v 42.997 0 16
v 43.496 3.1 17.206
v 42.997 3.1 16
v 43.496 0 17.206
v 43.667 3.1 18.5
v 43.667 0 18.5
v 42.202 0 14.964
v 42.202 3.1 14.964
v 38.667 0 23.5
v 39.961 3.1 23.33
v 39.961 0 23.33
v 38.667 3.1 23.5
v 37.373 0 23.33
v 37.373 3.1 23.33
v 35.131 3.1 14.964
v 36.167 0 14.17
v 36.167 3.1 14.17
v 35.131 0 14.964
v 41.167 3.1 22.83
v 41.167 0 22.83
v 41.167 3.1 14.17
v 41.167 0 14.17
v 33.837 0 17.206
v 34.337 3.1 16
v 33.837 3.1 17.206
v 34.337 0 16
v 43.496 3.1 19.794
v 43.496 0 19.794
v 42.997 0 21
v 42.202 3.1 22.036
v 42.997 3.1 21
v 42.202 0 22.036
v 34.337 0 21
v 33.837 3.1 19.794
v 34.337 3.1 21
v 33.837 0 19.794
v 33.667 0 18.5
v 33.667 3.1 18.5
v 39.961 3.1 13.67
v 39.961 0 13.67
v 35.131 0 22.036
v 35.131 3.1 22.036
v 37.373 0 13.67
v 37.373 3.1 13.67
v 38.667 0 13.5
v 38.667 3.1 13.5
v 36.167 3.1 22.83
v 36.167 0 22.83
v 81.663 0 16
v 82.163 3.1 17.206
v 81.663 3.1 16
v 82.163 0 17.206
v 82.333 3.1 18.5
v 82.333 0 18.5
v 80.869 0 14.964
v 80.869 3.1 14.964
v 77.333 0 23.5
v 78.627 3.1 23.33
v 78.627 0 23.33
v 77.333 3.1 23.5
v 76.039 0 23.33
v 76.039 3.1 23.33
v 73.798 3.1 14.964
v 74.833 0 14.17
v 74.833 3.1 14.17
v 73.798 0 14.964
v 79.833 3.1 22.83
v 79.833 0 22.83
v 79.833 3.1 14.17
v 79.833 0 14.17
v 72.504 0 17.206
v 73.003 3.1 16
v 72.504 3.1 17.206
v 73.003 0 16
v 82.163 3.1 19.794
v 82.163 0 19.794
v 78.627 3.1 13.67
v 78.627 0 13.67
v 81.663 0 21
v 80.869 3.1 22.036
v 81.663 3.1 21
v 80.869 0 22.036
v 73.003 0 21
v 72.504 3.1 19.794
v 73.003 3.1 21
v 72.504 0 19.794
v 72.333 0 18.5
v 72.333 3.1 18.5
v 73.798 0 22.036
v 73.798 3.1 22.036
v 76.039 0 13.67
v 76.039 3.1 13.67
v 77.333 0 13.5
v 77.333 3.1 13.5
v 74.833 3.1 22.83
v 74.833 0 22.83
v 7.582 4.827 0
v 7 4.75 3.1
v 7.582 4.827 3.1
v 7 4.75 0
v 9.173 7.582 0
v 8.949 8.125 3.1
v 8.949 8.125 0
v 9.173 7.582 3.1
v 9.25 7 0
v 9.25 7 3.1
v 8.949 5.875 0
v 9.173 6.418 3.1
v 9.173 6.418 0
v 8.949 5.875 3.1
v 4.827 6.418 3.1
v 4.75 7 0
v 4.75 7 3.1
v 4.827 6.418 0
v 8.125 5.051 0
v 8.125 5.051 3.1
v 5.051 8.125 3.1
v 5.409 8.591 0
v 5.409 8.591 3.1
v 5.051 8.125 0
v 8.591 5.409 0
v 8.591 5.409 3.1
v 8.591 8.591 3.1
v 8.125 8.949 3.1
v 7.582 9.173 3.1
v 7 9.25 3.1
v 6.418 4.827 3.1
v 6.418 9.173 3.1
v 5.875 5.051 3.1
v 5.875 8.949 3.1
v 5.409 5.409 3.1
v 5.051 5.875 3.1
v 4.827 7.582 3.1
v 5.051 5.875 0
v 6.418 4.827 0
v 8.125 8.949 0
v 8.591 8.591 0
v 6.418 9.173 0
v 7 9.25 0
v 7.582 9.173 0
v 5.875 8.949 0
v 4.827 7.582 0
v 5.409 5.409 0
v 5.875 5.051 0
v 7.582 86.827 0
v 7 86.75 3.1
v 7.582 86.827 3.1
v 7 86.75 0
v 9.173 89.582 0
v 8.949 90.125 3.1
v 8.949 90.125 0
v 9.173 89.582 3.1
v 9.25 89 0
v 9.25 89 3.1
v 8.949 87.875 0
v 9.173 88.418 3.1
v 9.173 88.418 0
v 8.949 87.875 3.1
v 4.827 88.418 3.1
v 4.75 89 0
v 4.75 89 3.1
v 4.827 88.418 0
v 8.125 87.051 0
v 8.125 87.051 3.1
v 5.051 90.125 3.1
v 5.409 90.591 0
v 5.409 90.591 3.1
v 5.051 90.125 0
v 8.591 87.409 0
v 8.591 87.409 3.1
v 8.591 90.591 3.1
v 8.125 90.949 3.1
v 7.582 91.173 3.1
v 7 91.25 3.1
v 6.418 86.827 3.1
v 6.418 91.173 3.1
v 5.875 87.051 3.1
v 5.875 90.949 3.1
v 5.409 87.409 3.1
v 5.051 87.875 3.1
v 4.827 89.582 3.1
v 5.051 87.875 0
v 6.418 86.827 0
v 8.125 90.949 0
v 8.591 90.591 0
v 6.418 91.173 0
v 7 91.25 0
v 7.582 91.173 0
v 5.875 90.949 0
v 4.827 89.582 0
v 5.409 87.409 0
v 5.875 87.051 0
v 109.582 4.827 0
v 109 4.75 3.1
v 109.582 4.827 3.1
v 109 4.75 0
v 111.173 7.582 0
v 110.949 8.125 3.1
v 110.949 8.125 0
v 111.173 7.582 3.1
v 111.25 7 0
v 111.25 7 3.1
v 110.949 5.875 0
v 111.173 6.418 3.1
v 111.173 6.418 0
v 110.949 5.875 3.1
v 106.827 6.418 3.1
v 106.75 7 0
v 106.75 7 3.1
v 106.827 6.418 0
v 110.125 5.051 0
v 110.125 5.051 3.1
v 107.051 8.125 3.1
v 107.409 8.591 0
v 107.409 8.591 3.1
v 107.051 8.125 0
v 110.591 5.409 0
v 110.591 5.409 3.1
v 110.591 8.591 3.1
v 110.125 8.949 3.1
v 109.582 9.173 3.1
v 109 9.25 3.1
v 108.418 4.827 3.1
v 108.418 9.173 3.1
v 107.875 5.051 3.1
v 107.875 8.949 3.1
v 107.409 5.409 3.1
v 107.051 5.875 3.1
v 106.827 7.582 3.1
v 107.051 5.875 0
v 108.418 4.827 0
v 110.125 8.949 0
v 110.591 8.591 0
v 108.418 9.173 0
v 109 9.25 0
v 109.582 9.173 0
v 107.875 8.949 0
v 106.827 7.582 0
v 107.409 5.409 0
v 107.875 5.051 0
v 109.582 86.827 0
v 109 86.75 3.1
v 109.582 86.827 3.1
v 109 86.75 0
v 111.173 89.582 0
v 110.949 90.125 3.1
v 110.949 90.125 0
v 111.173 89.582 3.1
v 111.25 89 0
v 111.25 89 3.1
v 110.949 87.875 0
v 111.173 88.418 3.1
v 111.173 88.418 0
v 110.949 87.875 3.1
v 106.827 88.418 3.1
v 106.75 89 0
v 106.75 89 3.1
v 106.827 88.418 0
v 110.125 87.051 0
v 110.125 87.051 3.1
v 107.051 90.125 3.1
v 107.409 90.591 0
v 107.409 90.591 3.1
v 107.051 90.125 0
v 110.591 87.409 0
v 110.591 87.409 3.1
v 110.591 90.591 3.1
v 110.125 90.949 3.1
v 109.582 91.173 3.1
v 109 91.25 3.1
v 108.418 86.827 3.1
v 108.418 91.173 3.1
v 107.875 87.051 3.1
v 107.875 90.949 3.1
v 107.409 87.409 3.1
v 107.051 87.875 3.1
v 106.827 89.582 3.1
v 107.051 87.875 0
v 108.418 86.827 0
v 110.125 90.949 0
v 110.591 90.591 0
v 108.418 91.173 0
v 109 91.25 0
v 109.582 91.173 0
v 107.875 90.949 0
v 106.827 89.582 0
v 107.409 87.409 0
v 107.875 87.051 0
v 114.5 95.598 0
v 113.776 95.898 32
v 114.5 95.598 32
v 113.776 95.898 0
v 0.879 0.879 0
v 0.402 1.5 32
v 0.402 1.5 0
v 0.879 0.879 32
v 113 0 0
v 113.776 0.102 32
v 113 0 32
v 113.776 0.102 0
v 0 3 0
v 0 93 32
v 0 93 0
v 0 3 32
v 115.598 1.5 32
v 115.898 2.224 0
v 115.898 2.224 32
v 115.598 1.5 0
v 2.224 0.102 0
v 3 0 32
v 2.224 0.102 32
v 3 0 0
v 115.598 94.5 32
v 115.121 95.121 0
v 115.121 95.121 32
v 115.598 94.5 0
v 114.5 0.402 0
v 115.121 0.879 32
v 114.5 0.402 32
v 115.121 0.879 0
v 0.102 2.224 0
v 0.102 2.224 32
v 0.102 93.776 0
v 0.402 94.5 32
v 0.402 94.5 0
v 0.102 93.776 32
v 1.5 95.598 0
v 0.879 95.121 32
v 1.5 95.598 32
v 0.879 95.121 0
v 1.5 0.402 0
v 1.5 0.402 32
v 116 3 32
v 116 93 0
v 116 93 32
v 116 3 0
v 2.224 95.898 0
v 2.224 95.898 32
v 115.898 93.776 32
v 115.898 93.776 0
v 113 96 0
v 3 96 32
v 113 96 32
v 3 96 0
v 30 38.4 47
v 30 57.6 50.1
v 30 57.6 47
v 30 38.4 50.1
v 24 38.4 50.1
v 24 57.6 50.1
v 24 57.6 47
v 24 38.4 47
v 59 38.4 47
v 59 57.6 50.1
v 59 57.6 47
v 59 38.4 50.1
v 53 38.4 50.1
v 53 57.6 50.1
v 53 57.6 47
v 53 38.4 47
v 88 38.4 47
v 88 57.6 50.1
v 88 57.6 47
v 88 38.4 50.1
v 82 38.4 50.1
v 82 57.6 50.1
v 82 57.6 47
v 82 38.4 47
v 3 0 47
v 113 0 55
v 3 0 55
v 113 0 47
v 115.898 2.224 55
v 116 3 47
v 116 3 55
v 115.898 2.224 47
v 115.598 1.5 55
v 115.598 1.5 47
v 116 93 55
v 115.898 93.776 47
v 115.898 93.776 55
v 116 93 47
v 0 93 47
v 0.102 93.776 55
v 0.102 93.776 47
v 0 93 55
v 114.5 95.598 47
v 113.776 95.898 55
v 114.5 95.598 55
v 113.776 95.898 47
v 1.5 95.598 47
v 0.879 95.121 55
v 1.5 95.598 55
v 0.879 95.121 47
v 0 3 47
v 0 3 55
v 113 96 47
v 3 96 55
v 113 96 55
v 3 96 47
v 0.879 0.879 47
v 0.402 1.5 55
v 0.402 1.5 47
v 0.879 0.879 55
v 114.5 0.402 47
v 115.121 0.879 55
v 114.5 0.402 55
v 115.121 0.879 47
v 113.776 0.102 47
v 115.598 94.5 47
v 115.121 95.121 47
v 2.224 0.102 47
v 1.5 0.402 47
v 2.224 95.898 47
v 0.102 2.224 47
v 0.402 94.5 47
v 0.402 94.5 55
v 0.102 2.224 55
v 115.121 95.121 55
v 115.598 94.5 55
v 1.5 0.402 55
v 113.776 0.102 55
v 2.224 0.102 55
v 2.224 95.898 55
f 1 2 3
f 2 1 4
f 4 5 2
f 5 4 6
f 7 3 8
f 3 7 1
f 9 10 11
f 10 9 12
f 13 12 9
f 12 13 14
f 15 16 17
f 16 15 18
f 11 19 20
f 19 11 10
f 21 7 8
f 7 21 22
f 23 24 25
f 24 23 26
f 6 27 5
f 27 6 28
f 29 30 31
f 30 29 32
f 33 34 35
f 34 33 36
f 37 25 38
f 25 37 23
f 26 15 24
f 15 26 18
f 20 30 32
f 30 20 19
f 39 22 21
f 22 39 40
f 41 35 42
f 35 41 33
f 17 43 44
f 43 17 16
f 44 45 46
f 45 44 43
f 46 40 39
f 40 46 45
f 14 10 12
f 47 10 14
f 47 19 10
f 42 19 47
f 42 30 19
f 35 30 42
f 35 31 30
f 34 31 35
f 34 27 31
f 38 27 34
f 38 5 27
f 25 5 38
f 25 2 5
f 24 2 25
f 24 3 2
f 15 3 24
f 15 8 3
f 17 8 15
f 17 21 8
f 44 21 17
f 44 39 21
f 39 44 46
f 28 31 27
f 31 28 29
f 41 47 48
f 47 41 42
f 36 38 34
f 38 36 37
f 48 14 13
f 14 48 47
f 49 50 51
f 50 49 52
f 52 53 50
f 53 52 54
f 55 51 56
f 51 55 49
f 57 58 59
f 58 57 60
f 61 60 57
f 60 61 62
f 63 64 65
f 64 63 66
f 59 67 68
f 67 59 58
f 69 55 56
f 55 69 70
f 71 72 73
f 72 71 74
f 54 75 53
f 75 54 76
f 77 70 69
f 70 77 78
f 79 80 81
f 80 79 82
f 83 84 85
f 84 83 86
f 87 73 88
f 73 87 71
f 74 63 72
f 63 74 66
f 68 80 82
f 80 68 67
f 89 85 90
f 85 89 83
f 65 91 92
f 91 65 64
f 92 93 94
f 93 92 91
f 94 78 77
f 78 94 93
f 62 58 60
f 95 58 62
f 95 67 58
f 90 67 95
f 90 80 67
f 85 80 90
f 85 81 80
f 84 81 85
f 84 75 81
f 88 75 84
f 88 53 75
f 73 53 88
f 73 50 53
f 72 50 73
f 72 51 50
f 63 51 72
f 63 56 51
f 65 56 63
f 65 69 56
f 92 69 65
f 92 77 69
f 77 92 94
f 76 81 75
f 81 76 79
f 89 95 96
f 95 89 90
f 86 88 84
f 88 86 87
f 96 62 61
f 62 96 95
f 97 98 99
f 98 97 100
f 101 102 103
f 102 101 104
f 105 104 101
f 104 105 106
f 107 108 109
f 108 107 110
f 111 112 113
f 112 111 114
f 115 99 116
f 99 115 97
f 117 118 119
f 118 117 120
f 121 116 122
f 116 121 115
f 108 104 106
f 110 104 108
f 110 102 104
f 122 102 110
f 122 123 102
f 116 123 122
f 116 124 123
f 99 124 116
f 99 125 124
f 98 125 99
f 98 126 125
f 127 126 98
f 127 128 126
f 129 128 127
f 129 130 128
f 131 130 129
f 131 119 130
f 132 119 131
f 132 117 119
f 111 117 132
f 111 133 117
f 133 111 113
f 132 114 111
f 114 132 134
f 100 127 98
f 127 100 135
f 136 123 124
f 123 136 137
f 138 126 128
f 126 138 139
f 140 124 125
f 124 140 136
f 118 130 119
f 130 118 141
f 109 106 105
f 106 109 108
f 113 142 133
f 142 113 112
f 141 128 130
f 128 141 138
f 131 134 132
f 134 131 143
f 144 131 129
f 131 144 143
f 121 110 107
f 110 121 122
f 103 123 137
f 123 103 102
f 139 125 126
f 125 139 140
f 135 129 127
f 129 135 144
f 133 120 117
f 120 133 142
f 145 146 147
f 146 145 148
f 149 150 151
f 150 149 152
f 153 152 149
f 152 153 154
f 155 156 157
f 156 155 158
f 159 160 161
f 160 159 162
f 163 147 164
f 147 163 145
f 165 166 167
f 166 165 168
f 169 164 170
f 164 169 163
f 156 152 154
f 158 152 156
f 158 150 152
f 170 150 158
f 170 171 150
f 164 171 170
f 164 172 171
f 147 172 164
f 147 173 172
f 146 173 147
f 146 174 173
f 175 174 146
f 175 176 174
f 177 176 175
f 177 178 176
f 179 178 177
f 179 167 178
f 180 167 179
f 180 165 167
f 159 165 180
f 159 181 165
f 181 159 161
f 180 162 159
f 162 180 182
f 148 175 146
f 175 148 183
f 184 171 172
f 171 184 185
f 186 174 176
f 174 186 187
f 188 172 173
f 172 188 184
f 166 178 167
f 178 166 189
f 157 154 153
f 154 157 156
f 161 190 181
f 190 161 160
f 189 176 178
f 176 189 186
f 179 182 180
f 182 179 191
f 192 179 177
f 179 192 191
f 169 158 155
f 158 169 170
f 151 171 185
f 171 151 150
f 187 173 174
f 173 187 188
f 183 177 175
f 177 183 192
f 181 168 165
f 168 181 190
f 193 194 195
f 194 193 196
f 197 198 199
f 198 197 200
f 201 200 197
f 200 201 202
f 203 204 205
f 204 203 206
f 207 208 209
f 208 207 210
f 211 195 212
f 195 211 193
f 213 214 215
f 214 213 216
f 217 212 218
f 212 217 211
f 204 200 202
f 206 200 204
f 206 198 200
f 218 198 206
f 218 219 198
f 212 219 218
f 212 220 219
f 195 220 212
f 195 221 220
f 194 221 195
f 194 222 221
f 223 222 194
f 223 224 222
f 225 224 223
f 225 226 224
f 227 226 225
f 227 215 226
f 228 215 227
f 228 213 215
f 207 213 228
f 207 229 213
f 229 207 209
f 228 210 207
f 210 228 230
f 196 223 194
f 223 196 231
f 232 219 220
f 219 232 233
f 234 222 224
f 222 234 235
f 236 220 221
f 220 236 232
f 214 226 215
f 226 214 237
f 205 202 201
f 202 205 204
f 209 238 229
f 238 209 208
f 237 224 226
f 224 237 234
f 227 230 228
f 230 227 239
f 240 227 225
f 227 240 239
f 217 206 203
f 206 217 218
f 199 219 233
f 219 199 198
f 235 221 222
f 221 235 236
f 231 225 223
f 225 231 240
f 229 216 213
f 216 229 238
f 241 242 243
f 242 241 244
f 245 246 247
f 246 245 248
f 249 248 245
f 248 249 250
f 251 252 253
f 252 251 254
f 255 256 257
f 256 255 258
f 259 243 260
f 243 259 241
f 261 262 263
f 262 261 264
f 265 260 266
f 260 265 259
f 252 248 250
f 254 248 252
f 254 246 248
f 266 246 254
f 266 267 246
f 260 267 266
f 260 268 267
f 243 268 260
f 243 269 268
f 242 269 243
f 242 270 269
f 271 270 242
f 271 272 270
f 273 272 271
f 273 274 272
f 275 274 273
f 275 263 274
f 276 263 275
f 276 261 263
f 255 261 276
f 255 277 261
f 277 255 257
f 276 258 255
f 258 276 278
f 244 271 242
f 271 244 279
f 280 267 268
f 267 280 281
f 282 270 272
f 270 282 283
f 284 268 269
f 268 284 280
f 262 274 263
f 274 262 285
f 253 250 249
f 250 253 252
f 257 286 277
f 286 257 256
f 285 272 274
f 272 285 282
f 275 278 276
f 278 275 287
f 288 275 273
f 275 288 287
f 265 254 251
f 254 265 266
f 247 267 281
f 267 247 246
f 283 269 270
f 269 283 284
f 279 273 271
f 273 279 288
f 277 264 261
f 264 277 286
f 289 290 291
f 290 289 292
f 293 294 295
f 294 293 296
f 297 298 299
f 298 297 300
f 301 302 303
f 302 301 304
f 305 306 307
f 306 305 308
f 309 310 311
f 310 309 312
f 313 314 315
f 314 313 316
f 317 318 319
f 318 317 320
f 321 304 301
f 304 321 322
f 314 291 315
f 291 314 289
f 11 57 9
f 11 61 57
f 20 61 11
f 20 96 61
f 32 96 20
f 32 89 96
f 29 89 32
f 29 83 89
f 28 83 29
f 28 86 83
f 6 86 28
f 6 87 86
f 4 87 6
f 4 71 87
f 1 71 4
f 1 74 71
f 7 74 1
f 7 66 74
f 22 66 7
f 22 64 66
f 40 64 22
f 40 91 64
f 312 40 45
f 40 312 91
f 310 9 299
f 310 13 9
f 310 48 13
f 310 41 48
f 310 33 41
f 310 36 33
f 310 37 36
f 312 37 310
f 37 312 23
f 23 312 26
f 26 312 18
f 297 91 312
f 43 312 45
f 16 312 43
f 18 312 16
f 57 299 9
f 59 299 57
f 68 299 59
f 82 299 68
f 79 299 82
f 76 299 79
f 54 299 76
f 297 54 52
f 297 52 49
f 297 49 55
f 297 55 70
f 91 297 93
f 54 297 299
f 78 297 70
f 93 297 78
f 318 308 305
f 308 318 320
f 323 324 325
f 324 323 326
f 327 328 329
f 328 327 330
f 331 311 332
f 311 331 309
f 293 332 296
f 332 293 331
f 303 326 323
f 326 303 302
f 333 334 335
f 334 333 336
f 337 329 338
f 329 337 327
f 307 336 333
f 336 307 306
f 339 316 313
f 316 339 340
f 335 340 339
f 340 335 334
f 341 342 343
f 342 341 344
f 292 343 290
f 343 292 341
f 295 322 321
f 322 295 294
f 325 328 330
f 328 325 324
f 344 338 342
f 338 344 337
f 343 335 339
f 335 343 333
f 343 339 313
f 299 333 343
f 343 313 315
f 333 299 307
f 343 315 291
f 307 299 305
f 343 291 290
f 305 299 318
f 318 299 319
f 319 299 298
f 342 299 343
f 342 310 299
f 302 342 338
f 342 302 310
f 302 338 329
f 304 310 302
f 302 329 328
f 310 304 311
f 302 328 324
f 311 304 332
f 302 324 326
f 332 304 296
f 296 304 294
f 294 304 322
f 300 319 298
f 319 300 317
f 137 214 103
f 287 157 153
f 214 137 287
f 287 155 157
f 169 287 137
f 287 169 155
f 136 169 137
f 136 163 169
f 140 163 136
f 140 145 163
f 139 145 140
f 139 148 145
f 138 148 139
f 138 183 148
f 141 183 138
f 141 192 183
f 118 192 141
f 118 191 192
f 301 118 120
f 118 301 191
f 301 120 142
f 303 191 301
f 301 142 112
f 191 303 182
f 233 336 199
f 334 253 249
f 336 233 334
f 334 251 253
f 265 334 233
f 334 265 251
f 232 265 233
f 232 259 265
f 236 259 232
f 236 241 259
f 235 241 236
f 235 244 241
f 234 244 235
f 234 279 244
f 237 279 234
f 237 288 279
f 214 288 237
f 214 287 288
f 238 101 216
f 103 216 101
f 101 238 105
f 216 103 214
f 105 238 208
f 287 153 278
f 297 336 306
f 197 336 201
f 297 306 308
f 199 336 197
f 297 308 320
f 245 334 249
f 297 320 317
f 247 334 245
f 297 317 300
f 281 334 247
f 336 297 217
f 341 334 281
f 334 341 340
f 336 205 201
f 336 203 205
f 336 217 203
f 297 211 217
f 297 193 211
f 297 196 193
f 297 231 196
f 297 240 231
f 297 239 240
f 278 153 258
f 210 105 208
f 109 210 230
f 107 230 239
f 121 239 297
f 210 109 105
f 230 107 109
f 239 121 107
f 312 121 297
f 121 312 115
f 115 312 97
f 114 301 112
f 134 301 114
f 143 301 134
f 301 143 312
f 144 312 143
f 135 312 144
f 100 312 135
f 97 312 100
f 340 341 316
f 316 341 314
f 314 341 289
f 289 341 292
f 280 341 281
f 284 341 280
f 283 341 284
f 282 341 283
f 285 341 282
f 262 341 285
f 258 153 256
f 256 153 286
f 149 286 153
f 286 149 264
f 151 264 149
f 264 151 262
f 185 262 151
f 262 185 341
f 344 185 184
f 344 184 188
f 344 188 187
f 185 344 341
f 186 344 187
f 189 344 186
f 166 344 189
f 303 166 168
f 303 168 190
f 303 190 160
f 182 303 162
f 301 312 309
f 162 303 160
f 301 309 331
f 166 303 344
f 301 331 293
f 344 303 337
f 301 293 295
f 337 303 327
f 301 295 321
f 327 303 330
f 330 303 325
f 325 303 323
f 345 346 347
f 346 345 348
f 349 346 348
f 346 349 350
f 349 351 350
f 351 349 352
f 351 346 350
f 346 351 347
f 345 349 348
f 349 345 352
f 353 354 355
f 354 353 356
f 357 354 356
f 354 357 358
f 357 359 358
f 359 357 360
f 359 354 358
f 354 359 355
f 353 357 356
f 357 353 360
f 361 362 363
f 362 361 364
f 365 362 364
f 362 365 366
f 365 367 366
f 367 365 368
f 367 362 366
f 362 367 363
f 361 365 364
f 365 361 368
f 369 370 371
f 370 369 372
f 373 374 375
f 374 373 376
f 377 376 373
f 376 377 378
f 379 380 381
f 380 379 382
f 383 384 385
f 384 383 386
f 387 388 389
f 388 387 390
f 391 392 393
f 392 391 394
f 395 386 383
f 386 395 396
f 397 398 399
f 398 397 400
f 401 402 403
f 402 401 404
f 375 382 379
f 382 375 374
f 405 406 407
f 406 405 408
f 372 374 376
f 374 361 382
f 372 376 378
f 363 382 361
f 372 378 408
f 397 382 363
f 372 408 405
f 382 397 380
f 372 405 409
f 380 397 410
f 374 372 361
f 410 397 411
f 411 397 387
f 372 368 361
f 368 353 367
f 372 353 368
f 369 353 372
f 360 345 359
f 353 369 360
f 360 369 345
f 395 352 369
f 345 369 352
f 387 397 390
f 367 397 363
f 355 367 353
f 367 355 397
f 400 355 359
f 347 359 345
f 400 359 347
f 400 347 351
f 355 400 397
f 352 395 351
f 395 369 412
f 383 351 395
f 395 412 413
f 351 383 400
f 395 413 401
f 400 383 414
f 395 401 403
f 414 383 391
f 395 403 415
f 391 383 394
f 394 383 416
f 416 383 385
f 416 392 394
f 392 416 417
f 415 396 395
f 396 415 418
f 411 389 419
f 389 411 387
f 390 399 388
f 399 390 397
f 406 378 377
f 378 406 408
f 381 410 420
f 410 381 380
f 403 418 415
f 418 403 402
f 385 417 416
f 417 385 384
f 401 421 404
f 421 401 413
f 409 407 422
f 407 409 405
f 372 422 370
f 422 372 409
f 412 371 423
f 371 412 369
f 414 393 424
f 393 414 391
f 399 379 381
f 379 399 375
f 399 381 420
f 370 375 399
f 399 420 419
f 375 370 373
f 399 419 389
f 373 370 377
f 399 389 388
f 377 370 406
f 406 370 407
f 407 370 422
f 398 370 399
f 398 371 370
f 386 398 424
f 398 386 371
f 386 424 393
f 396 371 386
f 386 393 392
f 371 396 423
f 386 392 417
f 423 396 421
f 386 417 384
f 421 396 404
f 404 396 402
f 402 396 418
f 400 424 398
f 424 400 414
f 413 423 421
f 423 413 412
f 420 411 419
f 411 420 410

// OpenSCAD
// ============================================================
// Parametric Enclosure — Electronics / Project Box
// ============================================================
// General-purpose electronics enclosure with lid, cable glands,
// and PCB mounting standoffs. Adjustable for any PCB.

// ---- PARAMETERS ----
// PCB dimensions
pcb_w       = 100;   // PCB width (mm)
pcb_d       = 80;    // PCB depth (mm)
pcb_standoff = 6;    // Standoff height (space under board for traces/connectors)

// Enclosure
wall        = 3;     // Wall thickness
lid_lip     = 5;     // Snap-fit lid overlap
clearance   = 5;     // Space around PCB on each side
top_clear   = 25;    // Clearance above PCB for components

// Cable glands
gland_count = 2;     // Number of cable entry holes on one side
gland_d     = 10;    // Cable gland hole diameter (M12 gland = 12mm, standard = 10mm)

// Mounting
mount_hole  = 4.5;   // M4 corner mounting holes
corner_r    = 3;     // Corner rounding

// ---- DERIVED ----
box_w = pcb_w + clearance*2 + wall*2;
box_d = pcb_d + clearance*2 + wall*2;
box_h = pcb_standoff + top_clear + wall*2;

// ---- HELPER: ROUNDED HULL ----
module rbox(w, d, h, r) {
    hull() {
        for (x = [r, w-r], y = [r, d-r])
            translate([x, y, 0]) cylinder(r=r, h=h, $fn=24);
    }
}

// ---- BOX BODY ----
module box_body() {
    difference() {
        rbox(box_w, box_d, box_h - lid_lip, corner_r);
        // Inner cavity
        translate([wall, wall, wall])
            rbox(box_w - wall*2, box_d - wall*2, box_h, max(0, corner_r - wall));
        // Cable gland holes
        for (i = [1 : gland_count])
            translate([box_w * i / (gland_count + 1), -0.1, box_h * 0.5])
            rotate([-90, 0, 0])
                cylinder(d=gland_d, h=wall + 0.2, $fn=24);
        // Corner mounting holes
        for (x = [wall + 4, box_w - wall - 4], y = [wall + 4, box_d - wall - 4])
            translate([x, y, -0.1]) cylinder(d=mount_hole, h=wall + 0.2, $fn=24);
    }
}

// ---- PCB STANDOFFS ----
module pcb_standoffs() {
    for (x = [wall + clearance + 3, wall + clearance + pcb_w - 3],
         y = [wall + clearance + 3, wall + clearance + pcb_d - 3])
    translate([x, y, wall])
    difference() {
        cylinder(d=6, h=pcb_standoff, $fn=24);
        translate([0, 0, -0.1]) cylinder(d=2.7, h=pcb_standoff + 0.2, $fn=24);
    }
}

// ---- LID ----
module lid() {
    translate([0, 0, box_h + 10]) // offset for display
    difference() {
        rbox(box_w, box_d, wall + lid_lip, corner_r);
        // Inner snap-fit lip
        translate([wall, wall, wall])
            rbox(box_w - wall*2, box_d - wall*2, lid_lip + 0.1, max(0, corner_r - wall));
        // Vent slots (optional — comment out if airtight needed)
        for (x = [1 : 3])
            translate([box_w * 0.25 * x - 5, box_d*0.4, -0.1])
                cube([6, box_d*0.2, wall + 0.2]);
    }
}

// ---- ASSEMBLE ----
box_body();
pcb_standoffs();
lid();
